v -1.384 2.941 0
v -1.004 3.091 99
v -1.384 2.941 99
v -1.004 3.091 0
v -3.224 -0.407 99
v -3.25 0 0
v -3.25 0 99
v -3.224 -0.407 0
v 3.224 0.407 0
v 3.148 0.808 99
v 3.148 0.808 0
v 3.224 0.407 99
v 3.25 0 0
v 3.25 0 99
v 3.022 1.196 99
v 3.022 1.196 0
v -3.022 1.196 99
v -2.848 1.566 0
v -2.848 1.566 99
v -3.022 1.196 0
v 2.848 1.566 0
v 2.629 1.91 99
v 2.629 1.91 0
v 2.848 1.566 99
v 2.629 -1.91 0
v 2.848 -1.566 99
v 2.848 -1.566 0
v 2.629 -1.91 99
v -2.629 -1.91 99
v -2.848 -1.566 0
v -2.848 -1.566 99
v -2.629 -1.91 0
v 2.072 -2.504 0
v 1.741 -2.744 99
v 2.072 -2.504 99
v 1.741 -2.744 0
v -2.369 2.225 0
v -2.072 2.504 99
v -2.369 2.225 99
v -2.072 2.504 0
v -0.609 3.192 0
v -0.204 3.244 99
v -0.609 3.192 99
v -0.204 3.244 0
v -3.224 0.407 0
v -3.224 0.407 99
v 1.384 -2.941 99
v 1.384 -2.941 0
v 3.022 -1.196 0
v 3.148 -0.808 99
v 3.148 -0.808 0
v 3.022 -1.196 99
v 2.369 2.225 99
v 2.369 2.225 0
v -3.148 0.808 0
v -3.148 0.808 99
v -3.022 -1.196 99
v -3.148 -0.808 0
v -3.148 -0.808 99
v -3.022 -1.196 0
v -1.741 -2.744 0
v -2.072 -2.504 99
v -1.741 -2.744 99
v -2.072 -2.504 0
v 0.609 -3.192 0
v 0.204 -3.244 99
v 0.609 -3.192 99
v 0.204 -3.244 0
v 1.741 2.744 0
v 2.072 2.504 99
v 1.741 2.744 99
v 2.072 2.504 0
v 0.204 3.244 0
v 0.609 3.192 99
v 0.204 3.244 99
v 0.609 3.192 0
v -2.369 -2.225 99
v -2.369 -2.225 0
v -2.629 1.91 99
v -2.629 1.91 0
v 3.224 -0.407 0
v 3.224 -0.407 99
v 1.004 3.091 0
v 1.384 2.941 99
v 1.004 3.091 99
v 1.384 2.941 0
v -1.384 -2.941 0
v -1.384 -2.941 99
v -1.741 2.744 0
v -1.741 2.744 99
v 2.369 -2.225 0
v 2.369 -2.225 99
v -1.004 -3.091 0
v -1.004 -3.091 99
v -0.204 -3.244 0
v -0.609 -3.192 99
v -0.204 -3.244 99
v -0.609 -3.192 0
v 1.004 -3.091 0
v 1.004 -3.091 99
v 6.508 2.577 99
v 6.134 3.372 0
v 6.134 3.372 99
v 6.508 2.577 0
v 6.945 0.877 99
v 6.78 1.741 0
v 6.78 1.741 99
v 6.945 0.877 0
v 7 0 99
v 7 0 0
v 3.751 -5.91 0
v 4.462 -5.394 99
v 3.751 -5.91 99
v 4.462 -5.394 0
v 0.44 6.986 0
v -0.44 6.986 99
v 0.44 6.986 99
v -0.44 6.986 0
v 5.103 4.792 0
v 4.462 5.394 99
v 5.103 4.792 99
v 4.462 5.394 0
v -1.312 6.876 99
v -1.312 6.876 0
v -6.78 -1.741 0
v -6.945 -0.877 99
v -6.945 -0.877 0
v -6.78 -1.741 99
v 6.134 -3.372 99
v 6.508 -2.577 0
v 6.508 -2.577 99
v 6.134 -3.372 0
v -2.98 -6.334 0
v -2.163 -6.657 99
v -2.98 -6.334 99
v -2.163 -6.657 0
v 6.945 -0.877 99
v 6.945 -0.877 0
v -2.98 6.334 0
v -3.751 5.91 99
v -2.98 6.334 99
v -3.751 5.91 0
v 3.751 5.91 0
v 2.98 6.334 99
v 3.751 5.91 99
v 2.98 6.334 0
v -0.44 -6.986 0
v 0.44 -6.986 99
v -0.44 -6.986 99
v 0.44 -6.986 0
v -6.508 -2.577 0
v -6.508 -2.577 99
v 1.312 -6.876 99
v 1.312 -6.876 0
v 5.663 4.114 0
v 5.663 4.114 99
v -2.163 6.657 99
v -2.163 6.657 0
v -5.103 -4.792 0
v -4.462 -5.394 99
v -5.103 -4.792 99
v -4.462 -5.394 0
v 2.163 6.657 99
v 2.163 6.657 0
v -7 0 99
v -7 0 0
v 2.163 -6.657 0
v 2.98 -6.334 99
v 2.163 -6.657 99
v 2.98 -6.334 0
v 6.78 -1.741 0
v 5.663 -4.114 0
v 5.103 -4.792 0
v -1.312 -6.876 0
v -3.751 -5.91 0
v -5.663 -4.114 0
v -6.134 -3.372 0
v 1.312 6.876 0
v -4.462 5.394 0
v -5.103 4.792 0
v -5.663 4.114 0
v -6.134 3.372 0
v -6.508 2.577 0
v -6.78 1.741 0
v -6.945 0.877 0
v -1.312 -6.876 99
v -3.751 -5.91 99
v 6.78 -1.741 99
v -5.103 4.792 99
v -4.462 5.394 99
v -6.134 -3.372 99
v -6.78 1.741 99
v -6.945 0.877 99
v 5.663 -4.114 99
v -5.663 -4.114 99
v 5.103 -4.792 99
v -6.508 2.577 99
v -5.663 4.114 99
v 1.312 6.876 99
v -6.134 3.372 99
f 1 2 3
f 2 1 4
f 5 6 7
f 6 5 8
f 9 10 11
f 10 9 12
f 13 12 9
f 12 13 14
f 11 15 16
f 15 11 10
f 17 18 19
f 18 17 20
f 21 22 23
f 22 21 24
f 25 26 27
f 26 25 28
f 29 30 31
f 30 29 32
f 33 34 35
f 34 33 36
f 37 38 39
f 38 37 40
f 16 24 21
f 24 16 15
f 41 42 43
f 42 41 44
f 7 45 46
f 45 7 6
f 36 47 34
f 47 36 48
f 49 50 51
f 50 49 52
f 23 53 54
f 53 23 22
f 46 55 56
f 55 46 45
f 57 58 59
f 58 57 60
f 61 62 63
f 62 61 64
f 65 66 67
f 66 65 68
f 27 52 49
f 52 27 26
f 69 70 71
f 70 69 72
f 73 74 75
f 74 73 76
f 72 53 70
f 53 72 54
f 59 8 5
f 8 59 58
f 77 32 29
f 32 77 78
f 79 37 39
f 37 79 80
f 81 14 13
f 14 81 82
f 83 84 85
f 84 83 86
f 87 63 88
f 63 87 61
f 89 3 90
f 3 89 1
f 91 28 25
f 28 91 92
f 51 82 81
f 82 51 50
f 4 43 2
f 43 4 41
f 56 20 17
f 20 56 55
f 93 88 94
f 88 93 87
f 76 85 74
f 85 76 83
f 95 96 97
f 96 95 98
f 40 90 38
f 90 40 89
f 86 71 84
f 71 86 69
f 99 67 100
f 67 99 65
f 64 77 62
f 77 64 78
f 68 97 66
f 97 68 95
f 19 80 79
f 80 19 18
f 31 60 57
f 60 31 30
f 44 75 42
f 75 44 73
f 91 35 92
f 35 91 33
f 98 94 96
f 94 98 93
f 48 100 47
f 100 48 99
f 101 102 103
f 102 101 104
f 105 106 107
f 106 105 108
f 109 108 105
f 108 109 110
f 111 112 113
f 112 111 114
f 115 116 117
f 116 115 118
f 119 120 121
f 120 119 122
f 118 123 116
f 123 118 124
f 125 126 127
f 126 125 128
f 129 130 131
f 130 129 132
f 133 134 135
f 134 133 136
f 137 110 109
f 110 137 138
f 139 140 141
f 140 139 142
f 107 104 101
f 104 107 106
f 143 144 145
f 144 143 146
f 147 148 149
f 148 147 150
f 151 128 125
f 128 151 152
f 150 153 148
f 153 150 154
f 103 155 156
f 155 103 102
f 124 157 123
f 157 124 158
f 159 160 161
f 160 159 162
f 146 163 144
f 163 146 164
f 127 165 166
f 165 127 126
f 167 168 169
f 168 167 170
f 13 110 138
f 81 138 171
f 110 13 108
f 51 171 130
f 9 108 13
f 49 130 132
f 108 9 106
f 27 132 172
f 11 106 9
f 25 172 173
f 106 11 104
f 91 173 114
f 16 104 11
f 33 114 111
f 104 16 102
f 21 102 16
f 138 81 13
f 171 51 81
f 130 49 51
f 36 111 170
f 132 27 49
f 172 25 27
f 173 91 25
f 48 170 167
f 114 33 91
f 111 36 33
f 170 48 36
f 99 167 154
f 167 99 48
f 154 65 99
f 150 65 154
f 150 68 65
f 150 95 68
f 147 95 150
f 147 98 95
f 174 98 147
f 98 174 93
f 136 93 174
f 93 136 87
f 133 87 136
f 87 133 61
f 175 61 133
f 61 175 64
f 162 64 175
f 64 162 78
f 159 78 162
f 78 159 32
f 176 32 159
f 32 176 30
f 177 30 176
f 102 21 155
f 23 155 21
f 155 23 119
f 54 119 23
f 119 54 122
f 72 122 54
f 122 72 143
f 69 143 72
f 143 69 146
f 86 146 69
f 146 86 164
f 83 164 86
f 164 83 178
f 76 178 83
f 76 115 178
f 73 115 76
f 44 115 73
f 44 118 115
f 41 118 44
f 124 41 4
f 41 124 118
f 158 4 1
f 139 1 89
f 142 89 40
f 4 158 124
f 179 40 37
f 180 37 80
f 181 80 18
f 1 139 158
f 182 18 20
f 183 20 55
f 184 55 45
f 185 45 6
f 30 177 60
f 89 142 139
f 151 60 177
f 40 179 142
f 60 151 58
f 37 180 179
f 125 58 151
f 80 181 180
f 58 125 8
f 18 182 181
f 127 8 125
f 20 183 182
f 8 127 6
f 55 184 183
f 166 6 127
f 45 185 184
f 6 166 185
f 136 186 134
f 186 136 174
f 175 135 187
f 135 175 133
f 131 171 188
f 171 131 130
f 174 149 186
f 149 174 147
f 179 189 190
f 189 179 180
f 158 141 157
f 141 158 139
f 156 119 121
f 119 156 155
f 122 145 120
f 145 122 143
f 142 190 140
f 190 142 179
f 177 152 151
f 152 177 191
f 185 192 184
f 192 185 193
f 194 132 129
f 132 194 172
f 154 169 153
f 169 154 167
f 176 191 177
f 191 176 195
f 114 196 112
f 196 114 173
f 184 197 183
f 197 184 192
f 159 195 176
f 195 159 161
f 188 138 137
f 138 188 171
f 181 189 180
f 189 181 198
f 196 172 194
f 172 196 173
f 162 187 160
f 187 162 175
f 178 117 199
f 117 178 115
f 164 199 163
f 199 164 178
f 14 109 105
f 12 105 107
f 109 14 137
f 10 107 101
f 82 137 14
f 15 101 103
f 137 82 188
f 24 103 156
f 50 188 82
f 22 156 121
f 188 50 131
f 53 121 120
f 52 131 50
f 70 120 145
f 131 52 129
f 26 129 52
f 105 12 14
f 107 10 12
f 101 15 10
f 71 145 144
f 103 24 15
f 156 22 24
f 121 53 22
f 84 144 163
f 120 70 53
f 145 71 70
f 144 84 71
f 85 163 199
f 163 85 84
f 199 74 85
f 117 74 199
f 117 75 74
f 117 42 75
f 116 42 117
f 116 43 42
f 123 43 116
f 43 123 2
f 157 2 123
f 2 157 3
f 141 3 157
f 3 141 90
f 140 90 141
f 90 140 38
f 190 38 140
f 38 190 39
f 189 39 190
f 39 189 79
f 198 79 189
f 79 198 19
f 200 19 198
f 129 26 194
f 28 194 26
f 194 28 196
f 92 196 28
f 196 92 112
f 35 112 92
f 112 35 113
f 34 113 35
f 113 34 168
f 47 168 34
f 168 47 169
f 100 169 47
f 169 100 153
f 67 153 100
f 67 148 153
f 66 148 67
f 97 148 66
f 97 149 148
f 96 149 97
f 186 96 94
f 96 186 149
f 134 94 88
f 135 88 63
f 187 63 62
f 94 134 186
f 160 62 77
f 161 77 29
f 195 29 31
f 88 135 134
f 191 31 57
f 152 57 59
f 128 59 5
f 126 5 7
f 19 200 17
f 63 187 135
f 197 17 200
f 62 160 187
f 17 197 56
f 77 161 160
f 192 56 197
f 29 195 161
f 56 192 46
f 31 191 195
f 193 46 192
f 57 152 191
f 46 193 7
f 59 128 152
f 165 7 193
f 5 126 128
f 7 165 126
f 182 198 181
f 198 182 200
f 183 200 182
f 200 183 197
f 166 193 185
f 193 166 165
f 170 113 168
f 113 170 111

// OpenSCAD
$fn = 50;


difference() {
	union() {
		*color(alpha = 1.0000000000, c = "gray") {
			translate(v = [0, 7, 0]) {
				linear_extrude(height = 1) {
					text(font = "Arial:style=Bold", halign = "center", size = 4.5000000000, text = "COMMENT plate main", valign = "center");
				}
			}
		}
		cylinder(h = 99, r = 7.0000000000);
	}
	union() {
		*color(alpha = 1.0000000000, c = "gray") {
			translate(v = [0, 7, 0]) {
				linear_extrude(height = 1) {
					text(font = "Arial:style=Bold", halign = "center", size = 4.5000000000, text = "COMMENT holes main", valign = "center");
				}
			}
		}
		translate(v = [0, 0, -100]) {
			cylinder(h = 200, r = 3.2500000000);
		}
		translate(v = [0, 0, -100]) {
			cylinder(h = 200, r = 1.8000000000);
		}
	}
}
